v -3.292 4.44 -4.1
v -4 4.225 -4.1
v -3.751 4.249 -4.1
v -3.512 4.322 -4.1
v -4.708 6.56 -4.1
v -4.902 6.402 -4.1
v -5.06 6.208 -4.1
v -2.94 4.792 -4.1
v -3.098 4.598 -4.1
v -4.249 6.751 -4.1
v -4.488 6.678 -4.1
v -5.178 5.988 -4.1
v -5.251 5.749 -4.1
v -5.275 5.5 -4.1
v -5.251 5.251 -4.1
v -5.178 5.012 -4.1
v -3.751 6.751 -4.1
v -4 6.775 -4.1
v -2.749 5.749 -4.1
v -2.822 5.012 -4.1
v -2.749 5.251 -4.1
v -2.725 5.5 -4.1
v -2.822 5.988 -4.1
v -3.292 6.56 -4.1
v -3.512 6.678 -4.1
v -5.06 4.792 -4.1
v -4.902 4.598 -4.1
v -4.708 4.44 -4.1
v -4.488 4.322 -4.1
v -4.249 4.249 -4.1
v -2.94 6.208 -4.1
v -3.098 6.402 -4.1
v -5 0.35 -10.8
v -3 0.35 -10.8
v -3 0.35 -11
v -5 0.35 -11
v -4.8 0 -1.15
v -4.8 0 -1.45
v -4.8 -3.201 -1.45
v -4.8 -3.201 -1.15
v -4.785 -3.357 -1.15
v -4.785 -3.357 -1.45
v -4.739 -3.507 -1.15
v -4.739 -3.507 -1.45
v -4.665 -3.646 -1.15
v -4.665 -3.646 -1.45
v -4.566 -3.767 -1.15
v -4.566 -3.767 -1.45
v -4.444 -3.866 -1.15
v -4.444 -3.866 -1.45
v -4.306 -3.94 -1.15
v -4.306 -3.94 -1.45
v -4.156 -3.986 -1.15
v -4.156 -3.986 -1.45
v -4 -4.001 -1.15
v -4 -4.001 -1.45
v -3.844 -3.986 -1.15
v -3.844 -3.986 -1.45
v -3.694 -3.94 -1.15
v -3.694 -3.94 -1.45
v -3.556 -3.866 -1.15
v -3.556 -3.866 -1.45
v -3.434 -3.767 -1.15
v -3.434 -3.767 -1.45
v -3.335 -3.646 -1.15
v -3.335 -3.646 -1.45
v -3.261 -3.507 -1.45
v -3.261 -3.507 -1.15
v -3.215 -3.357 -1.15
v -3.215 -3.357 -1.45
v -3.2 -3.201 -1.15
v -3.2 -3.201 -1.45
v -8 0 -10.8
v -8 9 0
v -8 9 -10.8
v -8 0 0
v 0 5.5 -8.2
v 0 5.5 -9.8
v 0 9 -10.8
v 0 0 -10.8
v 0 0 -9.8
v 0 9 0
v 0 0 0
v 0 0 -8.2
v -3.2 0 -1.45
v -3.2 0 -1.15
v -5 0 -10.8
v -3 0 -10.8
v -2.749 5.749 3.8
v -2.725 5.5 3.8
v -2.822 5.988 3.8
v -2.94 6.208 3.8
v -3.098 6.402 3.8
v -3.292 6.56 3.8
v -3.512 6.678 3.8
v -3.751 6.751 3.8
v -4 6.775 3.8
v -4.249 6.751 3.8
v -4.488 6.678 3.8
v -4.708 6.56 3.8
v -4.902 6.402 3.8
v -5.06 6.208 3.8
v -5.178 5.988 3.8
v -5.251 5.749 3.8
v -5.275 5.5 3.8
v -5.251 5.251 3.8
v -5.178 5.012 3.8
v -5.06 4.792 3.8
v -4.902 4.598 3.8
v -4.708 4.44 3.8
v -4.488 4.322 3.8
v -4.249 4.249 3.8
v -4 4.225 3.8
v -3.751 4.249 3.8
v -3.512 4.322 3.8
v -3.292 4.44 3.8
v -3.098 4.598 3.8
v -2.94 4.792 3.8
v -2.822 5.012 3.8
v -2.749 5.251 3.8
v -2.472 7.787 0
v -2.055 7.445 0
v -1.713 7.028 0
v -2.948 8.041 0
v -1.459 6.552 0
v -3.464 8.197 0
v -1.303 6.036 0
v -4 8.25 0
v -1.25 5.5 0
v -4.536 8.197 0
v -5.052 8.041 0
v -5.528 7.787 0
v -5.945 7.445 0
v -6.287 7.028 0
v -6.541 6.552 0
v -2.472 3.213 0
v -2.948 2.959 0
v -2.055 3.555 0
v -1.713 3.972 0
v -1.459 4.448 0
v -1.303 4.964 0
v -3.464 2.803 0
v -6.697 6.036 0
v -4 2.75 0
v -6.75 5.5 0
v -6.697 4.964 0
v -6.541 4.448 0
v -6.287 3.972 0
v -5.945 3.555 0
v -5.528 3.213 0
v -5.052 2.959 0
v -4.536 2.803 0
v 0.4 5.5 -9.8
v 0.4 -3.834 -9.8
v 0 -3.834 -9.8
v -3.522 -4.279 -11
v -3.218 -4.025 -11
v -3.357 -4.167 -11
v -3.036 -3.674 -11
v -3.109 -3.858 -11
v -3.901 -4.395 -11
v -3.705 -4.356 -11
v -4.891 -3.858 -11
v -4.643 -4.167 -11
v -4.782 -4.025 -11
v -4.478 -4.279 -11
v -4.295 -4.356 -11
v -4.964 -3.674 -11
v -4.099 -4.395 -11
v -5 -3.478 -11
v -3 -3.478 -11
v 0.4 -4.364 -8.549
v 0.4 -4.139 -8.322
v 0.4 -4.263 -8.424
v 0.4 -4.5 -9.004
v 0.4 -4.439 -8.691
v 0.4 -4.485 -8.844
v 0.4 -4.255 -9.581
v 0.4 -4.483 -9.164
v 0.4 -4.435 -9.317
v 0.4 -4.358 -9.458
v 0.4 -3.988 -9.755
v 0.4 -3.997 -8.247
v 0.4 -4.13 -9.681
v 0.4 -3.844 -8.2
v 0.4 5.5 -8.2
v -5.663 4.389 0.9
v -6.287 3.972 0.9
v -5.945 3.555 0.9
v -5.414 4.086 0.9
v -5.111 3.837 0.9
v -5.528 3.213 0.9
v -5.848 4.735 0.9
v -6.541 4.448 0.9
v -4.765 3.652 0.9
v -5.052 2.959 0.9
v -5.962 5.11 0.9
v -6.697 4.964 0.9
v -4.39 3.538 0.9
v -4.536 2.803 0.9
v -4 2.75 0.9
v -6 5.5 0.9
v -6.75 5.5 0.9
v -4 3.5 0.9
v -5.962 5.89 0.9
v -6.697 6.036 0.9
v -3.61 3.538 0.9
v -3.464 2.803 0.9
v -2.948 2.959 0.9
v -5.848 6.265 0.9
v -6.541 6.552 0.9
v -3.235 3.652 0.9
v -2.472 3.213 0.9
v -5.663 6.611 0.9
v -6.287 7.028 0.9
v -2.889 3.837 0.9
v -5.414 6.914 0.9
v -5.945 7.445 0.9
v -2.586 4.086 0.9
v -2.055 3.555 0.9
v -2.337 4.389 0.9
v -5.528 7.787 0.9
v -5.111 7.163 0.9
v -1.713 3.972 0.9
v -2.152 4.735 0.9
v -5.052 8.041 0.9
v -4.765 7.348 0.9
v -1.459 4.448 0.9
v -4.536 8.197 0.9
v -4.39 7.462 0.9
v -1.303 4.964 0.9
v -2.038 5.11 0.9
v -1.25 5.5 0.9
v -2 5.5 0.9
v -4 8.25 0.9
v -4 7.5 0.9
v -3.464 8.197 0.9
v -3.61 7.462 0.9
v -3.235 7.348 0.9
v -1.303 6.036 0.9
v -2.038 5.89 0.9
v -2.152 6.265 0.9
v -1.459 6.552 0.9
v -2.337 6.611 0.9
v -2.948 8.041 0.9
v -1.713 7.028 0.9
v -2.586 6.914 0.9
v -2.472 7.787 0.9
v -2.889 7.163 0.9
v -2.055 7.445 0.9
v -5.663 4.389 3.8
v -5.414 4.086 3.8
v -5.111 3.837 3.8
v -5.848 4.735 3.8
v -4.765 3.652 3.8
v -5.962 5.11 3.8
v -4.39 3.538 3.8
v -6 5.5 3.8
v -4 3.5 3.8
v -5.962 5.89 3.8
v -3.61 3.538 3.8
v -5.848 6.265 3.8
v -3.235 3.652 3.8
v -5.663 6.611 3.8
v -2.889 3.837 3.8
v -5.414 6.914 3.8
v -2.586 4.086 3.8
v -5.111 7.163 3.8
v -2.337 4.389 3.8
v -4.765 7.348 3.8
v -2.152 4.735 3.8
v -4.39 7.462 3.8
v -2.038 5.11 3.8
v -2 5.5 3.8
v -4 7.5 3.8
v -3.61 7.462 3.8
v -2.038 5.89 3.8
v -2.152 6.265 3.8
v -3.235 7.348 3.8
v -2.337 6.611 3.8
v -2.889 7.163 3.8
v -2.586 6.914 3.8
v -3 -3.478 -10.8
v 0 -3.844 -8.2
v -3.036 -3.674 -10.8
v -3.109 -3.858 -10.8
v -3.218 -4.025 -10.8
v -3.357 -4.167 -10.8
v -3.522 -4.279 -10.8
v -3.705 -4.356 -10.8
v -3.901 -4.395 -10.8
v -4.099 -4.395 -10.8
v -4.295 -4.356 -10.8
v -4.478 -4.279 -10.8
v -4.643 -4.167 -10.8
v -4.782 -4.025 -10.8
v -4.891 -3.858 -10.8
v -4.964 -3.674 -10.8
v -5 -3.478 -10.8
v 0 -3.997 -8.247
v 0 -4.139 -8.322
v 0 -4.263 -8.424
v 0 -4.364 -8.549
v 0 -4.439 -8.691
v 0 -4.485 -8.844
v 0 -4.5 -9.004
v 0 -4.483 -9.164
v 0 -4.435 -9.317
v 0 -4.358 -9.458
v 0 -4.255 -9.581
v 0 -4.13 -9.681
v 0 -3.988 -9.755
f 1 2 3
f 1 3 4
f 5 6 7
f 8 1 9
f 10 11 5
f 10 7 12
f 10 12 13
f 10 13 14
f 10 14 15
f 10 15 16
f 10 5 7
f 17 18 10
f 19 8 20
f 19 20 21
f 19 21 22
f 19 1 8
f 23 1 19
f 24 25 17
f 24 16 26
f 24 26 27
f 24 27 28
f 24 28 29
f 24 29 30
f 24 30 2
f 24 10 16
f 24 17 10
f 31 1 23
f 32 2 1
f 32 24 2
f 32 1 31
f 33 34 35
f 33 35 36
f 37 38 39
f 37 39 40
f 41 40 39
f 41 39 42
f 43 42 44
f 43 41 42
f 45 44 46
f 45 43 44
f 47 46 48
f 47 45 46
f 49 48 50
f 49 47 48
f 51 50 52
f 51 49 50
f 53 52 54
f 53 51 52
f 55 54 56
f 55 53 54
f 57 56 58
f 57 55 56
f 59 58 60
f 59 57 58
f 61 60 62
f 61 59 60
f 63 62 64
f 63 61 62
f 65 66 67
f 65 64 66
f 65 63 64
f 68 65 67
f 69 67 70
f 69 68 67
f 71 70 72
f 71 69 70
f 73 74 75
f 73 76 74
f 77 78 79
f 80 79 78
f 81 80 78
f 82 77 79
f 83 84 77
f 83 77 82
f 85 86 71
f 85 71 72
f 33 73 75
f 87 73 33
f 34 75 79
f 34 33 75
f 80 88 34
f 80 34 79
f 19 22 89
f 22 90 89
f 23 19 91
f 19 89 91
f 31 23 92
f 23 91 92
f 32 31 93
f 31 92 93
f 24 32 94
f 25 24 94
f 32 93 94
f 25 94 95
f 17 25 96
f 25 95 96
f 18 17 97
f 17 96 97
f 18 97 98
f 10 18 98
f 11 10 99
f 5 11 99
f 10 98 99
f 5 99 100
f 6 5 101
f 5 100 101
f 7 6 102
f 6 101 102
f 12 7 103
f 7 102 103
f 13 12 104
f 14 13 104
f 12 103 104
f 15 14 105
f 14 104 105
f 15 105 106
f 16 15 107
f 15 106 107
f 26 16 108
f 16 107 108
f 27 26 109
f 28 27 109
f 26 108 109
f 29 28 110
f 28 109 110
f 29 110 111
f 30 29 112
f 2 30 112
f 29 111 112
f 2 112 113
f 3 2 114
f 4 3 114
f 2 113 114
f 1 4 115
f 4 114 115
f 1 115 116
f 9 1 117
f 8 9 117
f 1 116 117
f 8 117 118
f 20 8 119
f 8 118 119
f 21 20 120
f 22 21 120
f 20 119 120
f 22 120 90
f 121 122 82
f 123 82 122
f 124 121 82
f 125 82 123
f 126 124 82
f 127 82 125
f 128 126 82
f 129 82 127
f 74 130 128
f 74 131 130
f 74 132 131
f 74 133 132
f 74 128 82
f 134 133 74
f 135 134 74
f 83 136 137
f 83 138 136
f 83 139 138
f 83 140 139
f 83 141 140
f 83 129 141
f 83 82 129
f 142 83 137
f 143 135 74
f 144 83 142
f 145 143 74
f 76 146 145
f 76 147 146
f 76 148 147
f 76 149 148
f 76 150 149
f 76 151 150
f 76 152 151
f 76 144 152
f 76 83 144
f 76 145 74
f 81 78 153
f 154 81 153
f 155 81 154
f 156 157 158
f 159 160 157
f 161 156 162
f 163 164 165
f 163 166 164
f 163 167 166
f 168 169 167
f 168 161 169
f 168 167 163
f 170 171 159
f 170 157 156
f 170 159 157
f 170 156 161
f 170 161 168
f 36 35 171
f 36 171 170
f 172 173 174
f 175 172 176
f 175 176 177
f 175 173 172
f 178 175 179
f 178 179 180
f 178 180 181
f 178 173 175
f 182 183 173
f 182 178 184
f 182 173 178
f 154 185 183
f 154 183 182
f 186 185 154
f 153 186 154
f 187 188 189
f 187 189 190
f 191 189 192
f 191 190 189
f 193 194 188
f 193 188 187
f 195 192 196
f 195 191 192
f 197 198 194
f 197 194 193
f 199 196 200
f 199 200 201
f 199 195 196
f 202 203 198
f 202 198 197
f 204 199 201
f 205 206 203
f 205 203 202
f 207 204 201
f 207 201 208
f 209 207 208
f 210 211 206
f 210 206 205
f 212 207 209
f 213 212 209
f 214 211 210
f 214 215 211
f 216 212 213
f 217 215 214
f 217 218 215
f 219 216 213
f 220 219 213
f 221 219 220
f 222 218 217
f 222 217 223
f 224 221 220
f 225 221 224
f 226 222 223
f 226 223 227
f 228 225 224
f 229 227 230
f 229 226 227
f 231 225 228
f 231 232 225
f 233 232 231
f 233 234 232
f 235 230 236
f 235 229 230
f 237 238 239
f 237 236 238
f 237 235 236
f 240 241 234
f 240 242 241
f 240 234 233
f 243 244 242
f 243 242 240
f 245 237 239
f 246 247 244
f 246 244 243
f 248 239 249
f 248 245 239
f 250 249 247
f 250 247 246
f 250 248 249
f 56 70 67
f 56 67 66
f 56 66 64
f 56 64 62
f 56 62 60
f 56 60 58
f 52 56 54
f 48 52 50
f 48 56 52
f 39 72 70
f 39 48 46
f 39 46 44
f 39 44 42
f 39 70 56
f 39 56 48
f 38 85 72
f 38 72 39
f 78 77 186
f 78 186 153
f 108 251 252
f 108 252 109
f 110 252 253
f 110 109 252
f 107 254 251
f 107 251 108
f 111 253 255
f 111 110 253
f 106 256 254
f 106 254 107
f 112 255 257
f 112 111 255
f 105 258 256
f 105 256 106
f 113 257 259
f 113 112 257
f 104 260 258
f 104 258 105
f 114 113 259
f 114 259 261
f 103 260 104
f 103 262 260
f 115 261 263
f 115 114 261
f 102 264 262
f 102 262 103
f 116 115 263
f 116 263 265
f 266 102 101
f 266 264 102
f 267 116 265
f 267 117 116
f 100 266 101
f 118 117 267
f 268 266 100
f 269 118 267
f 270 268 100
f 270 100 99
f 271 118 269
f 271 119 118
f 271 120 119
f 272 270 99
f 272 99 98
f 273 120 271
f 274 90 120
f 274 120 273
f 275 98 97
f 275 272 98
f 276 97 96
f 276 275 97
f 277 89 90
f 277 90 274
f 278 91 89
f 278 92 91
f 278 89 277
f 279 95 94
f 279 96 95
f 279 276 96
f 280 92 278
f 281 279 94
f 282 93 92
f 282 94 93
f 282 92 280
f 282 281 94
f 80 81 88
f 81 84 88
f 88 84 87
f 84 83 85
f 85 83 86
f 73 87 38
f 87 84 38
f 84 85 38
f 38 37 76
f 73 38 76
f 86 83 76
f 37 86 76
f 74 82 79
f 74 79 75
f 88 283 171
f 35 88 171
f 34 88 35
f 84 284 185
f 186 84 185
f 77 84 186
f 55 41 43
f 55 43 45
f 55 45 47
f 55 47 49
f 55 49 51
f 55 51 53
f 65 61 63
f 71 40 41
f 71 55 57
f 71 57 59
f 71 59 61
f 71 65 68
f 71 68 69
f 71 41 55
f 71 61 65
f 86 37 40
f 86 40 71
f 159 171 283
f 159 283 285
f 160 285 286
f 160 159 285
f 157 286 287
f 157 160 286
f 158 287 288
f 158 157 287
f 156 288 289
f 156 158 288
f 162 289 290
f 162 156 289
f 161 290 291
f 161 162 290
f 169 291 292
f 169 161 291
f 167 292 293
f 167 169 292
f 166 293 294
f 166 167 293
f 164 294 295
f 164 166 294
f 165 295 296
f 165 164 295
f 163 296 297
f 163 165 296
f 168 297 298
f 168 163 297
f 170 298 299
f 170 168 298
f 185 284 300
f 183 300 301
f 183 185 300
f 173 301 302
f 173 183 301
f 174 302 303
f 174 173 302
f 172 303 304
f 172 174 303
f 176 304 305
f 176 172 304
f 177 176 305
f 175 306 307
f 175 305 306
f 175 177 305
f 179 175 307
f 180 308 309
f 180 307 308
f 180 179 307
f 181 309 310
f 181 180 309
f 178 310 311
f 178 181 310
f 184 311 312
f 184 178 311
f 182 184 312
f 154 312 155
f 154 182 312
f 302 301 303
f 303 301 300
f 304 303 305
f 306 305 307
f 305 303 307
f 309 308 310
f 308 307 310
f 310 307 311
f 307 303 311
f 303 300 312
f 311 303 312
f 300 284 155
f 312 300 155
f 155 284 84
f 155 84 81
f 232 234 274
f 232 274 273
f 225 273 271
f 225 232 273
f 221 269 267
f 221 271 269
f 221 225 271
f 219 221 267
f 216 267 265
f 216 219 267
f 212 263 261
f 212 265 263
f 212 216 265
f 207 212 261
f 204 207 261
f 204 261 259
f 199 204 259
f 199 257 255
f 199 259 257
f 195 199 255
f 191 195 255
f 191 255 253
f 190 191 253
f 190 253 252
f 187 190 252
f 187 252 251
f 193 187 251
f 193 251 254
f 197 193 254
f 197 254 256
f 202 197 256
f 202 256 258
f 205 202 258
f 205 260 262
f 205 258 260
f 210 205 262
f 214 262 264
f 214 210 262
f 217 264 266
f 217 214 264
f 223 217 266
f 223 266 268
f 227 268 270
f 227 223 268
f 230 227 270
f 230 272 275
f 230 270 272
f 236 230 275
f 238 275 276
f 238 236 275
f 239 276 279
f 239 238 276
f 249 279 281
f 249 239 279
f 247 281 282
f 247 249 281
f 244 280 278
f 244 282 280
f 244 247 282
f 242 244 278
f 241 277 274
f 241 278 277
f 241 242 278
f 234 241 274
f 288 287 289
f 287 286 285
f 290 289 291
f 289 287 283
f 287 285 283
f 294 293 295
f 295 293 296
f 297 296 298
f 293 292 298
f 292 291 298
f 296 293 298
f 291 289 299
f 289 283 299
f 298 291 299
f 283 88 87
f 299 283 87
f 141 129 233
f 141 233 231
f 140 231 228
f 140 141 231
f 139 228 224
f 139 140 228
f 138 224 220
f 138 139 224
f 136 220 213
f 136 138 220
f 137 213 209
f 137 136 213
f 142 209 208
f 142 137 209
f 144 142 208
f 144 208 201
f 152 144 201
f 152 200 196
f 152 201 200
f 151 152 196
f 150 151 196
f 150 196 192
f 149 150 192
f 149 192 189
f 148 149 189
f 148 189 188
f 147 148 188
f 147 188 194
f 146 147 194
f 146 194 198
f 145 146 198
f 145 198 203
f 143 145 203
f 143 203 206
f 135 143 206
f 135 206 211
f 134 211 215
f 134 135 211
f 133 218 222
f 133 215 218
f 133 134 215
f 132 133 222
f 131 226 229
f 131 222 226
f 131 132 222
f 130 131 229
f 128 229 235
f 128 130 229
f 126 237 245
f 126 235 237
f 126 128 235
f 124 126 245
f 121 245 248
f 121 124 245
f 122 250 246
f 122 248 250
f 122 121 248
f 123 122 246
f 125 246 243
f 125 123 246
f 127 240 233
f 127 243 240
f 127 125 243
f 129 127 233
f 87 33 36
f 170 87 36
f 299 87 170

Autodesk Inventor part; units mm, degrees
ref_plane "YZ Plane" through (0, 0, 0) normal (1, 0, 0) x (0, 1, 0)
ref_plane "XZ Plane" through (0, 0, 0) normal (0, 1, 0) x (-1, 0, 0)
ref_plane "XY Plane" through (0, 0, 0) normal (0, 0, 1) x (1, 0, 0)
sketch "Эскиз1" plane through (0, 0, 0) normal (0, 1, 0) x (-1, 0, 0)
  line L0 (0, 0) -> (8, 0)
  line L1 (8, 0) -> (8, -10.8)
  line L2 (8, -10.8) -> (0, -10.8)
  line L3 (0, -10.8) -> (0, 0)
  dimension "d0" = 10.8
  dimension "d1" = 8
extrude "Выдавливание1" add sketch "Эскиз1" along normal blind 9
sketch "Эскиз2" plane through (-8, 0, 0) normal (0, 0, 1) x (1, 0, 0)
  circle A0 centre (4, 5.5) radius 2.75
  line L0 (8, 0) -> (8, 9) projected
  line L1 (0, 0) -> (8, 0) projected
  dimension "d4" = 5.5
  dimension "d5" = 4
  dimension "d6" = 5.5
extrude "Выдавливание2" add sketch "Эскиз2" along normal blind 0.9
sketch "Эскиз3" plane through (-4, 5.5, 0.9) normal (0, 0, 1) x (1, 0, 0)
  circle A0 centre (0, 0) radius 2
  point P0 (4, -5.5)
  dimension "d9" = 4
extrude "Выдавливание3" add sketch "Эскиз3" along normal blind 2.9
sketch "Эскиз4" plane through (-4, 5.5, 3.8) normal (0, 0, 1) x (1, 0, 0)
  circle A0 centre (0, 0) radius 2.75 projected
  circle A1 centre (0, 0) radius 1.275
  point P0 (4, -5.5)
  dimension "d12" = 2.55
extrude "Выдавливание4" cut sketch "Эскиз4" against normal blind 7.9 contours A1
sketch "Эскиз5" plane through (-8, 0, 0) normal (0, 0, 1) x (1, 0, 0)
  point P0 (8, 0)
sketch "Эскиз6" plane through (0, 0, 0) normal (0, -1, 0) x (1, 0, 0)
  line L0 (-4.8, -1.15) -> (-3.2, -1.15)
  line L1 (-3.2, -1.15) -> (-3.2, -1.45)
  line L2 (-3.2, -1.45) -> (-4.8, -1.45)
  line L3 (-4.8, -1.45) -> (-4.8, -1.15)
  line L4 (0, 0) -> (0, -10.8) projected
  line L5 (-8, 0) -> (0, 0) projected
  dimension "d15" = 1.6
  dimension "d16" = 0.3
  dimension "d17" = 3.2
  dimension "d18" = 1.15
extrude "Выдавливание5" add sketch "Эскиз6" along normal blind 4
sketch "Эскиз7" plane through (-4.8, 0, -1.15) normal (0, 0, 1) x (1, 0, 0)
  line L0 (0, 0) -> (0, -4) projected
  line L1 (1.6, 0) -> (1.6, -4) projected
  arc A0 (0, -3.2011) -> (1.6, -3.2011) centre (0.8, -3.2011) ccw
  line L2 (0, -3.2011) -> (0, -4)
  line L3 (1.6, -4) -> (0, -4) projected
  line L4 (1.6, -4) -> (1.6, -3.2011)
  point P0 (4.8, 0)
  point P1 (0.7588, -4)
  point P2 (0.8412, -4)
extrude "Выдавливание6" cut sketch "Эскиз7" against normal blind 4
sketch "Эскиз8" plane through (0, 0, 0) normal (1, 0, 0) x (0, 0, -1)
  line L0 (8.2, 5.5) -> (9.8, 5.5)
  line L1 (9.8, 5.5) -> (9.8, -4.5)
  line L2 (9.8, -4.5) -> (8.2, -4.5)
  line L3 (8.2, -4.5) -> (8.2, 5.5)
  line L4 (0, 9) -> (10.8, 9) projected
  line L5 (0, 0) -> (0, 9) projected
  dimension "d23" = 1.6
  dimension "d24" = 3.5
  dimension "d25" = 8.2
  dimension "d26" = 10
extrude "Выдавливание7" add sketch "Эскиз8" along normal blind 0.4
sketch "Эскиз9" plane through (0.4, 0, 0) normal (1, 0, 0) x (0, 0, -1)
  line L0 (8.2, 0) -> (8.2, -4.5) projected
  line L1 (9.8, -4.5) -> (9.8, 0) projected
  arc A0 (8.2, -3.8439) -> (9.8, -3.8337) centre (8.999, -3.6854) ccw
  line L2 (8.2, -3.8439) -> (8.2, -4.5)
  line L3 (8.2, -4.5) -> (9.8, -4.5) projected
  line L4 (9.8, -4.5) -> (9.8, -3.8337)
  point P0 (0, 0)
  point P1 (8.9981, -4.5)
extrude "Выдавливание8" cut sketch "Эскиз9" against normal blind 0.4
sketch "Эскиз10" plane through (0, 0, -10.8) normal (0, 0, -1) x (-1, 0, 0)
  line L0 (3, 0.35) -> (5, 0.35)
  line L1 (5, 0.35) -> (5, -4.4)
  line L2 (5, -4.4) -> (3, -4.4)
  line L3 (3, -4.4) -> (3, 0.35)
  line L4 (8, 0) -> (8, 9) projected
  line L5 (0, 0) -> (8, 0) projected
  dimension "d31" = 2
  dimension "d32" = 3
  dimension "d33" = 4.75
  dimension "d34" = 0.35
extrude "Выдавливание9" add sketch "Эскиз10" along normal blind 0.2
sketch "Эскиз11" plane through (0, 0, -11) normal (0, 0, -1) x (-1, 0, 0)
  line L0 (3, 0.35) -> (3, -4.4) projected
  line L1 (5, -4.4) -> (5, 0.35) projected
  arc A0 (3, -3.4779) -> (5, -3.4779) centre (4, -3.3967) ccw
  line L2 (3, -4.4) -> (5, -4.4) projected
  line L3 (3, -3.4779) -> (3, -4.4)
  line L4 (3, -4.4) -> (5, -4.4)
  line L5 (5, -4.4) -> (5, -3.4779)
  point P0 (0, 0)
  point P1 (4, -4.4)
extrude "Выдавливание10" cut sketch "Эскиз11" against normal blind 0.2
properties part number "PY-401N"
